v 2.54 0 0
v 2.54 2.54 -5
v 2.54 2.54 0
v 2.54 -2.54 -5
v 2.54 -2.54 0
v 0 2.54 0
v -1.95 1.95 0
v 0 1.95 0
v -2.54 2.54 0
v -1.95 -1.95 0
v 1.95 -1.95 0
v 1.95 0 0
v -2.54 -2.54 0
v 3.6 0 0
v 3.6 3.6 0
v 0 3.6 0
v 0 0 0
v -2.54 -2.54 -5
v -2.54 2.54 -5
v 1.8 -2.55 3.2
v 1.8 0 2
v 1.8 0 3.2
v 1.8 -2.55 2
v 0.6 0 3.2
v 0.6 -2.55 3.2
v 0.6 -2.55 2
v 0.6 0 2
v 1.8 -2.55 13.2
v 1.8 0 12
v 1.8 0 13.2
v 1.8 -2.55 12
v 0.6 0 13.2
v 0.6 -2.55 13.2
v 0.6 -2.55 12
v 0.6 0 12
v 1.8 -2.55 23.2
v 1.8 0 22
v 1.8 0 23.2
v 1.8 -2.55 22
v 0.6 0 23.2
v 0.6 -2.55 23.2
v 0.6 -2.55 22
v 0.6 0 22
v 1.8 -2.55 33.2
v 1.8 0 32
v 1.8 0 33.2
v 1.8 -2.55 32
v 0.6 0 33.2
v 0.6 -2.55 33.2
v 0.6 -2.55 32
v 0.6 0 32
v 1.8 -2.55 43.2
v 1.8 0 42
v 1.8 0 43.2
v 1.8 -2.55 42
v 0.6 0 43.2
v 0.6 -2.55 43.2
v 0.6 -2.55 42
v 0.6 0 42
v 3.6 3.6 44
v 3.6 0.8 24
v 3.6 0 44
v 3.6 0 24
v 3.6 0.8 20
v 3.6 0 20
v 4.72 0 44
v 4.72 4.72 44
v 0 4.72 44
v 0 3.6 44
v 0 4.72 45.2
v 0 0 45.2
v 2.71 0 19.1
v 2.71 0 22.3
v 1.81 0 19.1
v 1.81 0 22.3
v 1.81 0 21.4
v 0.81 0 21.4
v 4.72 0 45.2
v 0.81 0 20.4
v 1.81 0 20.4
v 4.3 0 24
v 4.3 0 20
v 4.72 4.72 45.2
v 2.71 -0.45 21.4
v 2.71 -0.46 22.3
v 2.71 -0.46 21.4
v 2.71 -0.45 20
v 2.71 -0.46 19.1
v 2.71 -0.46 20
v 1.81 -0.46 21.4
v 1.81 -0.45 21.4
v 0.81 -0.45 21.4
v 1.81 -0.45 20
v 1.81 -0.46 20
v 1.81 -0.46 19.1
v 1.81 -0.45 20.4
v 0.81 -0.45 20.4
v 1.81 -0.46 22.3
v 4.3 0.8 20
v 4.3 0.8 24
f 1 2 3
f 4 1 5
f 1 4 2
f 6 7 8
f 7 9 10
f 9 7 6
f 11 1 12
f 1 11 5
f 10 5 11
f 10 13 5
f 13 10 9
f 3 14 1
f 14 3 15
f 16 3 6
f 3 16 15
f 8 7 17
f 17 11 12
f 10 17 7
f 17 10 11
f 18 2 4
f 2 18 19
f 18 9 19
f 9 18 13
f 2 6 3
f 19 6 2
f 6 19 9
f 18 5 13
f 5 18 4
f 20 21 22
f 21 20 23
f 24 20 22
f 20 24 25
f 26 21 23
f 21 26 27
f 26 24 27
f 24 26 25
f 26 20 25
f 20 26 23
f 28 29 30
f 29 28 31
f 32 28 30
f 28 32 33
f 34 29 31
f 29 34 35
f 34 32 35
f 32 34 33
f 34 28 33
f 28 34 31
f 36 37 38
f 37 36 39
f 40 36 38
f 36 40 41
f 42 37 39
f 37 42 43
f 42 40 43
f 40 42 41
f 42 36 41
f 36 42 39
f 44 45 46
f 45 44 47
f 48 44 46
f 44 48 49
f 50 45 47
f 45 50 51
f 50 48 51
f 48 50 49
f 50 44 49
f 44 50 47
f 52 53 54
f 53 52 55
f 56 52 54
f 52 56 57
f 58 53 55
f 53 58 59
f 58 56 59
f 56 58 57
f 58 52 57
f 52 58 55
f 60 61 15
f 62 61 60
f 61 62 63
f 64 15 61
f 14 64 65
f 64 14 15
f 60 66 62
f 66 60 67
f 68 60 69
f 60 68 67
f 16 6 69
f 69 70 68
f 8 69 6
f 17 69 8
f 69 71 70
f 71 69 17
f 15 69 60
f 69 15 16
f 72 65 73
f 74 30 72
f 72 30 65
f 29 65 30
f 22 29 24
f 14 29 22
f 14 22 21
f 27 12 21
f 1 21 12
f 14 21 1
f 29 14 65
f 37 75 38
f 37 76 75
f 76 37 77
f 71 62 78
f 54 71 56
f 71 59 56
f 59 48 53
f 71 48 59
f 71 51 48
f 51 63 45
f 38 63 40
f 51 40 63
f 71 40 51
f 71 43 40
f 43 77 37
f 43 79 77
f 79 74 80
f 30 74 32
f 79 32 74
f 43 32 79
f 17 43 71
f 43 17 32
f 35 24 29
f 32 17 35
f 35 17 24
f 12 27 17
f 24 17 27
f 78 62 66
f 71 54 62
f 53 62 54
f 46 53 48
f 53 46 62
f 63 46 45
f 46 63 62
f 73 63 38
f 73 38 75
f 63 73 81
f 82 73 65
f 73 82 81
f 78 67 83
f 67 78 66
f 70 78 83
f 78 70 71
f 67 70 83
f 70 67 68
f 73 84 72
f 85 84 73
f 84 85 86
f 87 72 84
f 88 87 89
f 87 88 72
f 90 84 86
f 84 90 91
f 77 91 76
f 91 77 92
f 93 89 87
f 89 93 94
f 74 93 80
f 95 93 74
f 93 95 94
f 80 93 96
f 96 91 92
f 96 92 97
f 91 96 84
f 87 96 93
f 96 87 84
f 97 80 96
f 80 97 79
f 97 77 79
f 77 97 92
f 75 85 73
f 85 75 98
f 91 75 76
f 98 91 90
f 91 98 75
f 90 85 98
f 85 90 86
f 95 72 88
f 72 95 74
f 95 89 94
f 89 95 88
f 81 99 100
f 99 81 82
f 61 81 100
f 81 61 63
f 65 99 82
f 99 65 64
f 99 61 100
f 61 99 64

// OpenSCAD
// DND-106 (child of DND-104) -- reliability-first cell / mechanism CAD witness.
//
// This file is the CAD witness for the InventorAlpha reliability primitives
// (see 06-experiments/test14_low_cost_program/divergent/reliability_primitives_alpha.py).  It
// models, at the true 5.08 mm surface pitch:
//
//   * R2 -- the DOUBLE-ACTING WEDGE-GATE CELL: a two-position sliding gate
//     between two printed hard stops, sitting in the 1.48 mm lane beside a
//     3.60 mm column body.  The high stop is a printed wall; the low stop is
//     reached by the platen pushing the gate down (a driven, positive reset,
//     replacing S6-LC's release-and-trust-gravity reset).
//   * R1 -- the TOGGLE-ROCKER ROW MODULE: one off-pitch rocker per row with a
//     4-step staircase that the passive column teeth rest on.  The module is
//     deliberately OFF the 5.08 mm cell pitch (02-design-criteria: internal
//     machinery may be larger / shared / external).
//   * R3 -- the READ COMB finger that seats against a gate (detectable state).
//
// EVIDENCE CLASS: CAD (this file + the analytic printability checker).  It is
// NOT a print and NOT a measurement.  See 02-design-criteria for the sourced
// FDM limits and DND-27 for the no-print/no-purchase/no-measure constraint.
//
// Units: mm. Target process: Bambu X1C, PLA, 0.4 mm nozzle, 0.2 mm layers.

// --- shared surface scale ---------------------------------------------------
PITCH = 5.08;
LEVELS = 5;
TRAVEL = 40.0;

// --- unchanged visible column (S1 coupon conventions) -----------------------
COLUMN_CAP = 4.72;
COLUMN_BODY = 3.60;
RACK_PITCH = 10.0;
RACK_POCKETS = 5;
POCKET_DEPTH = 1.20;
POCKET_WIDTH = 2.40;

// --- R2: double-acting wedge gate -------------------------------------------
GATE_BODY_T = 0.90;             // 2-line sliding wedge (>= 0.88 mm robust)
GATE_THROW = 1.40;              // travel between the two hard stops
GATE_LANE = 1.48;               // lane beside the column body (pitch - body)
GATE_SHOULDER = 1.00;           // shoulder that blocks the column tooth
GATE_LOW_STOP = 0.90;           // printed low-stop wall
GATE_HIGH_STOP = 0.90;          // printed high-stop wall

// --- R1: row rocker + 4-step staircase (off-pitch module) -------------------
ROCKER_ARM_T = 1.32;            // 3-line load-bearing arm
ROCKER_STEPS = 4;               // 0/10/20/30/40 mm staircase
STEP_RISE = RACK_PITCH;         // 10 mm per step (level height)
STEP_TOOTH_W = 0.90;            // 2-line step/ledge tooth
STEP_TOOTH_L = 2.40;
ROTOR_R = 2.00;                 // printed rocker pivot boss radius
ROTOR_BORE_CLEAR = 0.25;        // printed boss-in-socket free play (total)

// --- R3: read-comb finger ---------------------------------------------------
FINGER_T = 0.90;                // 2-line compliant finger
FINGER_L = 4.00;
FINGER_W = 0.80;                // < 2-line in Y: it is a compliant sensor,
                                // reported by the checker as a sensing risk,
                                // not a load-bearing wall

// --- printed housing / base -------------------------------------------------
WALL = 0.90;
BASE = 3.00;
MIN_FDM_WALL = 0.44;

$fn = 48;
EPS = 0.01;

module column() {
    cube([COLUMN_BODY, COLUMN_BODY, TRAVEL + 4.0], center = false);
    translate([0, 0, TRAVEL + 4.0])
        cube([COLUMN_CAP, COLUMN_CAP, 1.2], center = false);
    // 5-pocket rack on one face (height is set by which pocket the pawl rests in)
    for (k = [0:RACK_POCKETS - 1])
        translate([COLUMN_BODY / 2 - POCKET_DEPTH, -PITCH / 2 - EPS,
                   k * RACK_PITCH + 2.0])
            cube([POCKET_DEPTH, PITCH + 2 * EPS, 1.2]);
}

module wedge_gate() {
    // R2: sliding wedge gate in the lane, between two printed hard stops.
    // high stop (raised state) at the top, low stop (lowered) at the bottom.
    translate([COLUMN_BODY / 2 + EPS, -GATE_BODY_T / 2, TRAVEL * 0.5])
        cube([GATE_BODY_T, GATE_BODY_T, GATE_THROW]);
    // the gate's shoulder that blocks the column lift tooth when raised
    translate([COLUMN_BODY / 2 - GATE_SHOULDER + EPS,
               -GATE_BODY_T / 2, TRAVEL * 0.5 + GATE_THROW - GATE_SHOULDER])
        cube([GATE_SHOULDER, GATE_BODY_T, GATE_SHOULDER]);
}

module gate_stops() {
    // printed hard stops: raised wall above, lowered wall below.
    translate([COLUMN_BODY / 2 + EPS, -GATE_BODY_T / 2 - EPS,
               TRAVEL * 0.5 + GATE_THROW])
        cube([GATE_BODY_T, GATE_BODY_T + 2 * EPS, GATE_HIGH_STOP]);
    translate([COLUMN_BODY / 2 + EPS, -GATE_BODY_T / 2 - EPS,
               TRAVEL * 0.5 - GATE_LOW_STOP])
        cube([GATE_BODY_T, GATE_BODY_T + 2 * EPS, GATE_LOW_STOP]);
}

module r2_cell() {
    column();
    wedge_gate();
    gate_stops();
}

// R1 row rocker module: OFF-PITCH (placed beside the row) with a 4-step
// staircase whose steps the passive column teeth rest on.
module row_rocker() {
    // rocker arm (load-bearing, 3-line)
    translate([-8.0, -ROCKER_ARM_T / 2, 0])
        cube([12.0, ROCKER_ARM_T, ROCKER_ARM_T]);
    // pivot boss
    translate([-8.0, 0, 0]) cylinder(r = ROTOR_R, h = ROCKER_ARM_T);
    // 4-step staircase carried by the rocker
    for (k = [0:ROCKER_STEPS - 1])
        translate([k * STEP_TOOTH_L, -STEP_TOOTH_W / 2, k * STEP_RISE])
            cube([STEP_TOOTH_L, STEP_TOOTH_W, STEP_TOOTH_W]);
}

module r3_read_finger() {
    // compliant read finger that seats against a gate to sense its state
    translate([0, 0, 0]) cube([FINGER_T, FINGER_W, FINGER_L]);
}

module frame() {
    difference() {
        translate([-PITCH / 2, -PITCH / 2, -BASE - 2.0])
            cube([PITCH, PITCH, BASE + 2.0]);
        translate([-COLUMN_BODY / 2 - 0.15, -COLUMN_BODY / 2 - 0.15, 0])
            cube([COLUMN_BODY + 0.30, COLUMN_BODY + 0.30, TRAVEL + 6.0],
                 center = false);
    }
}

module reliability_cell_assembly() {
    frame();
    r2_cell();
    translate([COLUMN_BODY / 2 + 1.6, 0, TRAVEL * 0.5]) r3_read_finger();
}

// The 5x3 true-pitch coupon witness: 5 columns x 3 rows at 5.08 mm pitch.
module coupon_witness() {
    for (i = [0:4]) for (j = [0:2])
        translate([i * PITCH, j * PITCH, 0]) reliability_cell_assembly();
}

part = "assembly";

if (part == "assembly") {
    reliability_cell_assembly();
} else if (part == "coupon") {
    coupon_witness();
} else if (part == "column") {
    column();
} else if (part == "gate") {
    wedge_gate();
} else if (part == "stops") {
    gate_stops();
} else if (part == "rocker") {
    row_rocker();
} else if (part == "finger") {
    r3_read_finger();
}
